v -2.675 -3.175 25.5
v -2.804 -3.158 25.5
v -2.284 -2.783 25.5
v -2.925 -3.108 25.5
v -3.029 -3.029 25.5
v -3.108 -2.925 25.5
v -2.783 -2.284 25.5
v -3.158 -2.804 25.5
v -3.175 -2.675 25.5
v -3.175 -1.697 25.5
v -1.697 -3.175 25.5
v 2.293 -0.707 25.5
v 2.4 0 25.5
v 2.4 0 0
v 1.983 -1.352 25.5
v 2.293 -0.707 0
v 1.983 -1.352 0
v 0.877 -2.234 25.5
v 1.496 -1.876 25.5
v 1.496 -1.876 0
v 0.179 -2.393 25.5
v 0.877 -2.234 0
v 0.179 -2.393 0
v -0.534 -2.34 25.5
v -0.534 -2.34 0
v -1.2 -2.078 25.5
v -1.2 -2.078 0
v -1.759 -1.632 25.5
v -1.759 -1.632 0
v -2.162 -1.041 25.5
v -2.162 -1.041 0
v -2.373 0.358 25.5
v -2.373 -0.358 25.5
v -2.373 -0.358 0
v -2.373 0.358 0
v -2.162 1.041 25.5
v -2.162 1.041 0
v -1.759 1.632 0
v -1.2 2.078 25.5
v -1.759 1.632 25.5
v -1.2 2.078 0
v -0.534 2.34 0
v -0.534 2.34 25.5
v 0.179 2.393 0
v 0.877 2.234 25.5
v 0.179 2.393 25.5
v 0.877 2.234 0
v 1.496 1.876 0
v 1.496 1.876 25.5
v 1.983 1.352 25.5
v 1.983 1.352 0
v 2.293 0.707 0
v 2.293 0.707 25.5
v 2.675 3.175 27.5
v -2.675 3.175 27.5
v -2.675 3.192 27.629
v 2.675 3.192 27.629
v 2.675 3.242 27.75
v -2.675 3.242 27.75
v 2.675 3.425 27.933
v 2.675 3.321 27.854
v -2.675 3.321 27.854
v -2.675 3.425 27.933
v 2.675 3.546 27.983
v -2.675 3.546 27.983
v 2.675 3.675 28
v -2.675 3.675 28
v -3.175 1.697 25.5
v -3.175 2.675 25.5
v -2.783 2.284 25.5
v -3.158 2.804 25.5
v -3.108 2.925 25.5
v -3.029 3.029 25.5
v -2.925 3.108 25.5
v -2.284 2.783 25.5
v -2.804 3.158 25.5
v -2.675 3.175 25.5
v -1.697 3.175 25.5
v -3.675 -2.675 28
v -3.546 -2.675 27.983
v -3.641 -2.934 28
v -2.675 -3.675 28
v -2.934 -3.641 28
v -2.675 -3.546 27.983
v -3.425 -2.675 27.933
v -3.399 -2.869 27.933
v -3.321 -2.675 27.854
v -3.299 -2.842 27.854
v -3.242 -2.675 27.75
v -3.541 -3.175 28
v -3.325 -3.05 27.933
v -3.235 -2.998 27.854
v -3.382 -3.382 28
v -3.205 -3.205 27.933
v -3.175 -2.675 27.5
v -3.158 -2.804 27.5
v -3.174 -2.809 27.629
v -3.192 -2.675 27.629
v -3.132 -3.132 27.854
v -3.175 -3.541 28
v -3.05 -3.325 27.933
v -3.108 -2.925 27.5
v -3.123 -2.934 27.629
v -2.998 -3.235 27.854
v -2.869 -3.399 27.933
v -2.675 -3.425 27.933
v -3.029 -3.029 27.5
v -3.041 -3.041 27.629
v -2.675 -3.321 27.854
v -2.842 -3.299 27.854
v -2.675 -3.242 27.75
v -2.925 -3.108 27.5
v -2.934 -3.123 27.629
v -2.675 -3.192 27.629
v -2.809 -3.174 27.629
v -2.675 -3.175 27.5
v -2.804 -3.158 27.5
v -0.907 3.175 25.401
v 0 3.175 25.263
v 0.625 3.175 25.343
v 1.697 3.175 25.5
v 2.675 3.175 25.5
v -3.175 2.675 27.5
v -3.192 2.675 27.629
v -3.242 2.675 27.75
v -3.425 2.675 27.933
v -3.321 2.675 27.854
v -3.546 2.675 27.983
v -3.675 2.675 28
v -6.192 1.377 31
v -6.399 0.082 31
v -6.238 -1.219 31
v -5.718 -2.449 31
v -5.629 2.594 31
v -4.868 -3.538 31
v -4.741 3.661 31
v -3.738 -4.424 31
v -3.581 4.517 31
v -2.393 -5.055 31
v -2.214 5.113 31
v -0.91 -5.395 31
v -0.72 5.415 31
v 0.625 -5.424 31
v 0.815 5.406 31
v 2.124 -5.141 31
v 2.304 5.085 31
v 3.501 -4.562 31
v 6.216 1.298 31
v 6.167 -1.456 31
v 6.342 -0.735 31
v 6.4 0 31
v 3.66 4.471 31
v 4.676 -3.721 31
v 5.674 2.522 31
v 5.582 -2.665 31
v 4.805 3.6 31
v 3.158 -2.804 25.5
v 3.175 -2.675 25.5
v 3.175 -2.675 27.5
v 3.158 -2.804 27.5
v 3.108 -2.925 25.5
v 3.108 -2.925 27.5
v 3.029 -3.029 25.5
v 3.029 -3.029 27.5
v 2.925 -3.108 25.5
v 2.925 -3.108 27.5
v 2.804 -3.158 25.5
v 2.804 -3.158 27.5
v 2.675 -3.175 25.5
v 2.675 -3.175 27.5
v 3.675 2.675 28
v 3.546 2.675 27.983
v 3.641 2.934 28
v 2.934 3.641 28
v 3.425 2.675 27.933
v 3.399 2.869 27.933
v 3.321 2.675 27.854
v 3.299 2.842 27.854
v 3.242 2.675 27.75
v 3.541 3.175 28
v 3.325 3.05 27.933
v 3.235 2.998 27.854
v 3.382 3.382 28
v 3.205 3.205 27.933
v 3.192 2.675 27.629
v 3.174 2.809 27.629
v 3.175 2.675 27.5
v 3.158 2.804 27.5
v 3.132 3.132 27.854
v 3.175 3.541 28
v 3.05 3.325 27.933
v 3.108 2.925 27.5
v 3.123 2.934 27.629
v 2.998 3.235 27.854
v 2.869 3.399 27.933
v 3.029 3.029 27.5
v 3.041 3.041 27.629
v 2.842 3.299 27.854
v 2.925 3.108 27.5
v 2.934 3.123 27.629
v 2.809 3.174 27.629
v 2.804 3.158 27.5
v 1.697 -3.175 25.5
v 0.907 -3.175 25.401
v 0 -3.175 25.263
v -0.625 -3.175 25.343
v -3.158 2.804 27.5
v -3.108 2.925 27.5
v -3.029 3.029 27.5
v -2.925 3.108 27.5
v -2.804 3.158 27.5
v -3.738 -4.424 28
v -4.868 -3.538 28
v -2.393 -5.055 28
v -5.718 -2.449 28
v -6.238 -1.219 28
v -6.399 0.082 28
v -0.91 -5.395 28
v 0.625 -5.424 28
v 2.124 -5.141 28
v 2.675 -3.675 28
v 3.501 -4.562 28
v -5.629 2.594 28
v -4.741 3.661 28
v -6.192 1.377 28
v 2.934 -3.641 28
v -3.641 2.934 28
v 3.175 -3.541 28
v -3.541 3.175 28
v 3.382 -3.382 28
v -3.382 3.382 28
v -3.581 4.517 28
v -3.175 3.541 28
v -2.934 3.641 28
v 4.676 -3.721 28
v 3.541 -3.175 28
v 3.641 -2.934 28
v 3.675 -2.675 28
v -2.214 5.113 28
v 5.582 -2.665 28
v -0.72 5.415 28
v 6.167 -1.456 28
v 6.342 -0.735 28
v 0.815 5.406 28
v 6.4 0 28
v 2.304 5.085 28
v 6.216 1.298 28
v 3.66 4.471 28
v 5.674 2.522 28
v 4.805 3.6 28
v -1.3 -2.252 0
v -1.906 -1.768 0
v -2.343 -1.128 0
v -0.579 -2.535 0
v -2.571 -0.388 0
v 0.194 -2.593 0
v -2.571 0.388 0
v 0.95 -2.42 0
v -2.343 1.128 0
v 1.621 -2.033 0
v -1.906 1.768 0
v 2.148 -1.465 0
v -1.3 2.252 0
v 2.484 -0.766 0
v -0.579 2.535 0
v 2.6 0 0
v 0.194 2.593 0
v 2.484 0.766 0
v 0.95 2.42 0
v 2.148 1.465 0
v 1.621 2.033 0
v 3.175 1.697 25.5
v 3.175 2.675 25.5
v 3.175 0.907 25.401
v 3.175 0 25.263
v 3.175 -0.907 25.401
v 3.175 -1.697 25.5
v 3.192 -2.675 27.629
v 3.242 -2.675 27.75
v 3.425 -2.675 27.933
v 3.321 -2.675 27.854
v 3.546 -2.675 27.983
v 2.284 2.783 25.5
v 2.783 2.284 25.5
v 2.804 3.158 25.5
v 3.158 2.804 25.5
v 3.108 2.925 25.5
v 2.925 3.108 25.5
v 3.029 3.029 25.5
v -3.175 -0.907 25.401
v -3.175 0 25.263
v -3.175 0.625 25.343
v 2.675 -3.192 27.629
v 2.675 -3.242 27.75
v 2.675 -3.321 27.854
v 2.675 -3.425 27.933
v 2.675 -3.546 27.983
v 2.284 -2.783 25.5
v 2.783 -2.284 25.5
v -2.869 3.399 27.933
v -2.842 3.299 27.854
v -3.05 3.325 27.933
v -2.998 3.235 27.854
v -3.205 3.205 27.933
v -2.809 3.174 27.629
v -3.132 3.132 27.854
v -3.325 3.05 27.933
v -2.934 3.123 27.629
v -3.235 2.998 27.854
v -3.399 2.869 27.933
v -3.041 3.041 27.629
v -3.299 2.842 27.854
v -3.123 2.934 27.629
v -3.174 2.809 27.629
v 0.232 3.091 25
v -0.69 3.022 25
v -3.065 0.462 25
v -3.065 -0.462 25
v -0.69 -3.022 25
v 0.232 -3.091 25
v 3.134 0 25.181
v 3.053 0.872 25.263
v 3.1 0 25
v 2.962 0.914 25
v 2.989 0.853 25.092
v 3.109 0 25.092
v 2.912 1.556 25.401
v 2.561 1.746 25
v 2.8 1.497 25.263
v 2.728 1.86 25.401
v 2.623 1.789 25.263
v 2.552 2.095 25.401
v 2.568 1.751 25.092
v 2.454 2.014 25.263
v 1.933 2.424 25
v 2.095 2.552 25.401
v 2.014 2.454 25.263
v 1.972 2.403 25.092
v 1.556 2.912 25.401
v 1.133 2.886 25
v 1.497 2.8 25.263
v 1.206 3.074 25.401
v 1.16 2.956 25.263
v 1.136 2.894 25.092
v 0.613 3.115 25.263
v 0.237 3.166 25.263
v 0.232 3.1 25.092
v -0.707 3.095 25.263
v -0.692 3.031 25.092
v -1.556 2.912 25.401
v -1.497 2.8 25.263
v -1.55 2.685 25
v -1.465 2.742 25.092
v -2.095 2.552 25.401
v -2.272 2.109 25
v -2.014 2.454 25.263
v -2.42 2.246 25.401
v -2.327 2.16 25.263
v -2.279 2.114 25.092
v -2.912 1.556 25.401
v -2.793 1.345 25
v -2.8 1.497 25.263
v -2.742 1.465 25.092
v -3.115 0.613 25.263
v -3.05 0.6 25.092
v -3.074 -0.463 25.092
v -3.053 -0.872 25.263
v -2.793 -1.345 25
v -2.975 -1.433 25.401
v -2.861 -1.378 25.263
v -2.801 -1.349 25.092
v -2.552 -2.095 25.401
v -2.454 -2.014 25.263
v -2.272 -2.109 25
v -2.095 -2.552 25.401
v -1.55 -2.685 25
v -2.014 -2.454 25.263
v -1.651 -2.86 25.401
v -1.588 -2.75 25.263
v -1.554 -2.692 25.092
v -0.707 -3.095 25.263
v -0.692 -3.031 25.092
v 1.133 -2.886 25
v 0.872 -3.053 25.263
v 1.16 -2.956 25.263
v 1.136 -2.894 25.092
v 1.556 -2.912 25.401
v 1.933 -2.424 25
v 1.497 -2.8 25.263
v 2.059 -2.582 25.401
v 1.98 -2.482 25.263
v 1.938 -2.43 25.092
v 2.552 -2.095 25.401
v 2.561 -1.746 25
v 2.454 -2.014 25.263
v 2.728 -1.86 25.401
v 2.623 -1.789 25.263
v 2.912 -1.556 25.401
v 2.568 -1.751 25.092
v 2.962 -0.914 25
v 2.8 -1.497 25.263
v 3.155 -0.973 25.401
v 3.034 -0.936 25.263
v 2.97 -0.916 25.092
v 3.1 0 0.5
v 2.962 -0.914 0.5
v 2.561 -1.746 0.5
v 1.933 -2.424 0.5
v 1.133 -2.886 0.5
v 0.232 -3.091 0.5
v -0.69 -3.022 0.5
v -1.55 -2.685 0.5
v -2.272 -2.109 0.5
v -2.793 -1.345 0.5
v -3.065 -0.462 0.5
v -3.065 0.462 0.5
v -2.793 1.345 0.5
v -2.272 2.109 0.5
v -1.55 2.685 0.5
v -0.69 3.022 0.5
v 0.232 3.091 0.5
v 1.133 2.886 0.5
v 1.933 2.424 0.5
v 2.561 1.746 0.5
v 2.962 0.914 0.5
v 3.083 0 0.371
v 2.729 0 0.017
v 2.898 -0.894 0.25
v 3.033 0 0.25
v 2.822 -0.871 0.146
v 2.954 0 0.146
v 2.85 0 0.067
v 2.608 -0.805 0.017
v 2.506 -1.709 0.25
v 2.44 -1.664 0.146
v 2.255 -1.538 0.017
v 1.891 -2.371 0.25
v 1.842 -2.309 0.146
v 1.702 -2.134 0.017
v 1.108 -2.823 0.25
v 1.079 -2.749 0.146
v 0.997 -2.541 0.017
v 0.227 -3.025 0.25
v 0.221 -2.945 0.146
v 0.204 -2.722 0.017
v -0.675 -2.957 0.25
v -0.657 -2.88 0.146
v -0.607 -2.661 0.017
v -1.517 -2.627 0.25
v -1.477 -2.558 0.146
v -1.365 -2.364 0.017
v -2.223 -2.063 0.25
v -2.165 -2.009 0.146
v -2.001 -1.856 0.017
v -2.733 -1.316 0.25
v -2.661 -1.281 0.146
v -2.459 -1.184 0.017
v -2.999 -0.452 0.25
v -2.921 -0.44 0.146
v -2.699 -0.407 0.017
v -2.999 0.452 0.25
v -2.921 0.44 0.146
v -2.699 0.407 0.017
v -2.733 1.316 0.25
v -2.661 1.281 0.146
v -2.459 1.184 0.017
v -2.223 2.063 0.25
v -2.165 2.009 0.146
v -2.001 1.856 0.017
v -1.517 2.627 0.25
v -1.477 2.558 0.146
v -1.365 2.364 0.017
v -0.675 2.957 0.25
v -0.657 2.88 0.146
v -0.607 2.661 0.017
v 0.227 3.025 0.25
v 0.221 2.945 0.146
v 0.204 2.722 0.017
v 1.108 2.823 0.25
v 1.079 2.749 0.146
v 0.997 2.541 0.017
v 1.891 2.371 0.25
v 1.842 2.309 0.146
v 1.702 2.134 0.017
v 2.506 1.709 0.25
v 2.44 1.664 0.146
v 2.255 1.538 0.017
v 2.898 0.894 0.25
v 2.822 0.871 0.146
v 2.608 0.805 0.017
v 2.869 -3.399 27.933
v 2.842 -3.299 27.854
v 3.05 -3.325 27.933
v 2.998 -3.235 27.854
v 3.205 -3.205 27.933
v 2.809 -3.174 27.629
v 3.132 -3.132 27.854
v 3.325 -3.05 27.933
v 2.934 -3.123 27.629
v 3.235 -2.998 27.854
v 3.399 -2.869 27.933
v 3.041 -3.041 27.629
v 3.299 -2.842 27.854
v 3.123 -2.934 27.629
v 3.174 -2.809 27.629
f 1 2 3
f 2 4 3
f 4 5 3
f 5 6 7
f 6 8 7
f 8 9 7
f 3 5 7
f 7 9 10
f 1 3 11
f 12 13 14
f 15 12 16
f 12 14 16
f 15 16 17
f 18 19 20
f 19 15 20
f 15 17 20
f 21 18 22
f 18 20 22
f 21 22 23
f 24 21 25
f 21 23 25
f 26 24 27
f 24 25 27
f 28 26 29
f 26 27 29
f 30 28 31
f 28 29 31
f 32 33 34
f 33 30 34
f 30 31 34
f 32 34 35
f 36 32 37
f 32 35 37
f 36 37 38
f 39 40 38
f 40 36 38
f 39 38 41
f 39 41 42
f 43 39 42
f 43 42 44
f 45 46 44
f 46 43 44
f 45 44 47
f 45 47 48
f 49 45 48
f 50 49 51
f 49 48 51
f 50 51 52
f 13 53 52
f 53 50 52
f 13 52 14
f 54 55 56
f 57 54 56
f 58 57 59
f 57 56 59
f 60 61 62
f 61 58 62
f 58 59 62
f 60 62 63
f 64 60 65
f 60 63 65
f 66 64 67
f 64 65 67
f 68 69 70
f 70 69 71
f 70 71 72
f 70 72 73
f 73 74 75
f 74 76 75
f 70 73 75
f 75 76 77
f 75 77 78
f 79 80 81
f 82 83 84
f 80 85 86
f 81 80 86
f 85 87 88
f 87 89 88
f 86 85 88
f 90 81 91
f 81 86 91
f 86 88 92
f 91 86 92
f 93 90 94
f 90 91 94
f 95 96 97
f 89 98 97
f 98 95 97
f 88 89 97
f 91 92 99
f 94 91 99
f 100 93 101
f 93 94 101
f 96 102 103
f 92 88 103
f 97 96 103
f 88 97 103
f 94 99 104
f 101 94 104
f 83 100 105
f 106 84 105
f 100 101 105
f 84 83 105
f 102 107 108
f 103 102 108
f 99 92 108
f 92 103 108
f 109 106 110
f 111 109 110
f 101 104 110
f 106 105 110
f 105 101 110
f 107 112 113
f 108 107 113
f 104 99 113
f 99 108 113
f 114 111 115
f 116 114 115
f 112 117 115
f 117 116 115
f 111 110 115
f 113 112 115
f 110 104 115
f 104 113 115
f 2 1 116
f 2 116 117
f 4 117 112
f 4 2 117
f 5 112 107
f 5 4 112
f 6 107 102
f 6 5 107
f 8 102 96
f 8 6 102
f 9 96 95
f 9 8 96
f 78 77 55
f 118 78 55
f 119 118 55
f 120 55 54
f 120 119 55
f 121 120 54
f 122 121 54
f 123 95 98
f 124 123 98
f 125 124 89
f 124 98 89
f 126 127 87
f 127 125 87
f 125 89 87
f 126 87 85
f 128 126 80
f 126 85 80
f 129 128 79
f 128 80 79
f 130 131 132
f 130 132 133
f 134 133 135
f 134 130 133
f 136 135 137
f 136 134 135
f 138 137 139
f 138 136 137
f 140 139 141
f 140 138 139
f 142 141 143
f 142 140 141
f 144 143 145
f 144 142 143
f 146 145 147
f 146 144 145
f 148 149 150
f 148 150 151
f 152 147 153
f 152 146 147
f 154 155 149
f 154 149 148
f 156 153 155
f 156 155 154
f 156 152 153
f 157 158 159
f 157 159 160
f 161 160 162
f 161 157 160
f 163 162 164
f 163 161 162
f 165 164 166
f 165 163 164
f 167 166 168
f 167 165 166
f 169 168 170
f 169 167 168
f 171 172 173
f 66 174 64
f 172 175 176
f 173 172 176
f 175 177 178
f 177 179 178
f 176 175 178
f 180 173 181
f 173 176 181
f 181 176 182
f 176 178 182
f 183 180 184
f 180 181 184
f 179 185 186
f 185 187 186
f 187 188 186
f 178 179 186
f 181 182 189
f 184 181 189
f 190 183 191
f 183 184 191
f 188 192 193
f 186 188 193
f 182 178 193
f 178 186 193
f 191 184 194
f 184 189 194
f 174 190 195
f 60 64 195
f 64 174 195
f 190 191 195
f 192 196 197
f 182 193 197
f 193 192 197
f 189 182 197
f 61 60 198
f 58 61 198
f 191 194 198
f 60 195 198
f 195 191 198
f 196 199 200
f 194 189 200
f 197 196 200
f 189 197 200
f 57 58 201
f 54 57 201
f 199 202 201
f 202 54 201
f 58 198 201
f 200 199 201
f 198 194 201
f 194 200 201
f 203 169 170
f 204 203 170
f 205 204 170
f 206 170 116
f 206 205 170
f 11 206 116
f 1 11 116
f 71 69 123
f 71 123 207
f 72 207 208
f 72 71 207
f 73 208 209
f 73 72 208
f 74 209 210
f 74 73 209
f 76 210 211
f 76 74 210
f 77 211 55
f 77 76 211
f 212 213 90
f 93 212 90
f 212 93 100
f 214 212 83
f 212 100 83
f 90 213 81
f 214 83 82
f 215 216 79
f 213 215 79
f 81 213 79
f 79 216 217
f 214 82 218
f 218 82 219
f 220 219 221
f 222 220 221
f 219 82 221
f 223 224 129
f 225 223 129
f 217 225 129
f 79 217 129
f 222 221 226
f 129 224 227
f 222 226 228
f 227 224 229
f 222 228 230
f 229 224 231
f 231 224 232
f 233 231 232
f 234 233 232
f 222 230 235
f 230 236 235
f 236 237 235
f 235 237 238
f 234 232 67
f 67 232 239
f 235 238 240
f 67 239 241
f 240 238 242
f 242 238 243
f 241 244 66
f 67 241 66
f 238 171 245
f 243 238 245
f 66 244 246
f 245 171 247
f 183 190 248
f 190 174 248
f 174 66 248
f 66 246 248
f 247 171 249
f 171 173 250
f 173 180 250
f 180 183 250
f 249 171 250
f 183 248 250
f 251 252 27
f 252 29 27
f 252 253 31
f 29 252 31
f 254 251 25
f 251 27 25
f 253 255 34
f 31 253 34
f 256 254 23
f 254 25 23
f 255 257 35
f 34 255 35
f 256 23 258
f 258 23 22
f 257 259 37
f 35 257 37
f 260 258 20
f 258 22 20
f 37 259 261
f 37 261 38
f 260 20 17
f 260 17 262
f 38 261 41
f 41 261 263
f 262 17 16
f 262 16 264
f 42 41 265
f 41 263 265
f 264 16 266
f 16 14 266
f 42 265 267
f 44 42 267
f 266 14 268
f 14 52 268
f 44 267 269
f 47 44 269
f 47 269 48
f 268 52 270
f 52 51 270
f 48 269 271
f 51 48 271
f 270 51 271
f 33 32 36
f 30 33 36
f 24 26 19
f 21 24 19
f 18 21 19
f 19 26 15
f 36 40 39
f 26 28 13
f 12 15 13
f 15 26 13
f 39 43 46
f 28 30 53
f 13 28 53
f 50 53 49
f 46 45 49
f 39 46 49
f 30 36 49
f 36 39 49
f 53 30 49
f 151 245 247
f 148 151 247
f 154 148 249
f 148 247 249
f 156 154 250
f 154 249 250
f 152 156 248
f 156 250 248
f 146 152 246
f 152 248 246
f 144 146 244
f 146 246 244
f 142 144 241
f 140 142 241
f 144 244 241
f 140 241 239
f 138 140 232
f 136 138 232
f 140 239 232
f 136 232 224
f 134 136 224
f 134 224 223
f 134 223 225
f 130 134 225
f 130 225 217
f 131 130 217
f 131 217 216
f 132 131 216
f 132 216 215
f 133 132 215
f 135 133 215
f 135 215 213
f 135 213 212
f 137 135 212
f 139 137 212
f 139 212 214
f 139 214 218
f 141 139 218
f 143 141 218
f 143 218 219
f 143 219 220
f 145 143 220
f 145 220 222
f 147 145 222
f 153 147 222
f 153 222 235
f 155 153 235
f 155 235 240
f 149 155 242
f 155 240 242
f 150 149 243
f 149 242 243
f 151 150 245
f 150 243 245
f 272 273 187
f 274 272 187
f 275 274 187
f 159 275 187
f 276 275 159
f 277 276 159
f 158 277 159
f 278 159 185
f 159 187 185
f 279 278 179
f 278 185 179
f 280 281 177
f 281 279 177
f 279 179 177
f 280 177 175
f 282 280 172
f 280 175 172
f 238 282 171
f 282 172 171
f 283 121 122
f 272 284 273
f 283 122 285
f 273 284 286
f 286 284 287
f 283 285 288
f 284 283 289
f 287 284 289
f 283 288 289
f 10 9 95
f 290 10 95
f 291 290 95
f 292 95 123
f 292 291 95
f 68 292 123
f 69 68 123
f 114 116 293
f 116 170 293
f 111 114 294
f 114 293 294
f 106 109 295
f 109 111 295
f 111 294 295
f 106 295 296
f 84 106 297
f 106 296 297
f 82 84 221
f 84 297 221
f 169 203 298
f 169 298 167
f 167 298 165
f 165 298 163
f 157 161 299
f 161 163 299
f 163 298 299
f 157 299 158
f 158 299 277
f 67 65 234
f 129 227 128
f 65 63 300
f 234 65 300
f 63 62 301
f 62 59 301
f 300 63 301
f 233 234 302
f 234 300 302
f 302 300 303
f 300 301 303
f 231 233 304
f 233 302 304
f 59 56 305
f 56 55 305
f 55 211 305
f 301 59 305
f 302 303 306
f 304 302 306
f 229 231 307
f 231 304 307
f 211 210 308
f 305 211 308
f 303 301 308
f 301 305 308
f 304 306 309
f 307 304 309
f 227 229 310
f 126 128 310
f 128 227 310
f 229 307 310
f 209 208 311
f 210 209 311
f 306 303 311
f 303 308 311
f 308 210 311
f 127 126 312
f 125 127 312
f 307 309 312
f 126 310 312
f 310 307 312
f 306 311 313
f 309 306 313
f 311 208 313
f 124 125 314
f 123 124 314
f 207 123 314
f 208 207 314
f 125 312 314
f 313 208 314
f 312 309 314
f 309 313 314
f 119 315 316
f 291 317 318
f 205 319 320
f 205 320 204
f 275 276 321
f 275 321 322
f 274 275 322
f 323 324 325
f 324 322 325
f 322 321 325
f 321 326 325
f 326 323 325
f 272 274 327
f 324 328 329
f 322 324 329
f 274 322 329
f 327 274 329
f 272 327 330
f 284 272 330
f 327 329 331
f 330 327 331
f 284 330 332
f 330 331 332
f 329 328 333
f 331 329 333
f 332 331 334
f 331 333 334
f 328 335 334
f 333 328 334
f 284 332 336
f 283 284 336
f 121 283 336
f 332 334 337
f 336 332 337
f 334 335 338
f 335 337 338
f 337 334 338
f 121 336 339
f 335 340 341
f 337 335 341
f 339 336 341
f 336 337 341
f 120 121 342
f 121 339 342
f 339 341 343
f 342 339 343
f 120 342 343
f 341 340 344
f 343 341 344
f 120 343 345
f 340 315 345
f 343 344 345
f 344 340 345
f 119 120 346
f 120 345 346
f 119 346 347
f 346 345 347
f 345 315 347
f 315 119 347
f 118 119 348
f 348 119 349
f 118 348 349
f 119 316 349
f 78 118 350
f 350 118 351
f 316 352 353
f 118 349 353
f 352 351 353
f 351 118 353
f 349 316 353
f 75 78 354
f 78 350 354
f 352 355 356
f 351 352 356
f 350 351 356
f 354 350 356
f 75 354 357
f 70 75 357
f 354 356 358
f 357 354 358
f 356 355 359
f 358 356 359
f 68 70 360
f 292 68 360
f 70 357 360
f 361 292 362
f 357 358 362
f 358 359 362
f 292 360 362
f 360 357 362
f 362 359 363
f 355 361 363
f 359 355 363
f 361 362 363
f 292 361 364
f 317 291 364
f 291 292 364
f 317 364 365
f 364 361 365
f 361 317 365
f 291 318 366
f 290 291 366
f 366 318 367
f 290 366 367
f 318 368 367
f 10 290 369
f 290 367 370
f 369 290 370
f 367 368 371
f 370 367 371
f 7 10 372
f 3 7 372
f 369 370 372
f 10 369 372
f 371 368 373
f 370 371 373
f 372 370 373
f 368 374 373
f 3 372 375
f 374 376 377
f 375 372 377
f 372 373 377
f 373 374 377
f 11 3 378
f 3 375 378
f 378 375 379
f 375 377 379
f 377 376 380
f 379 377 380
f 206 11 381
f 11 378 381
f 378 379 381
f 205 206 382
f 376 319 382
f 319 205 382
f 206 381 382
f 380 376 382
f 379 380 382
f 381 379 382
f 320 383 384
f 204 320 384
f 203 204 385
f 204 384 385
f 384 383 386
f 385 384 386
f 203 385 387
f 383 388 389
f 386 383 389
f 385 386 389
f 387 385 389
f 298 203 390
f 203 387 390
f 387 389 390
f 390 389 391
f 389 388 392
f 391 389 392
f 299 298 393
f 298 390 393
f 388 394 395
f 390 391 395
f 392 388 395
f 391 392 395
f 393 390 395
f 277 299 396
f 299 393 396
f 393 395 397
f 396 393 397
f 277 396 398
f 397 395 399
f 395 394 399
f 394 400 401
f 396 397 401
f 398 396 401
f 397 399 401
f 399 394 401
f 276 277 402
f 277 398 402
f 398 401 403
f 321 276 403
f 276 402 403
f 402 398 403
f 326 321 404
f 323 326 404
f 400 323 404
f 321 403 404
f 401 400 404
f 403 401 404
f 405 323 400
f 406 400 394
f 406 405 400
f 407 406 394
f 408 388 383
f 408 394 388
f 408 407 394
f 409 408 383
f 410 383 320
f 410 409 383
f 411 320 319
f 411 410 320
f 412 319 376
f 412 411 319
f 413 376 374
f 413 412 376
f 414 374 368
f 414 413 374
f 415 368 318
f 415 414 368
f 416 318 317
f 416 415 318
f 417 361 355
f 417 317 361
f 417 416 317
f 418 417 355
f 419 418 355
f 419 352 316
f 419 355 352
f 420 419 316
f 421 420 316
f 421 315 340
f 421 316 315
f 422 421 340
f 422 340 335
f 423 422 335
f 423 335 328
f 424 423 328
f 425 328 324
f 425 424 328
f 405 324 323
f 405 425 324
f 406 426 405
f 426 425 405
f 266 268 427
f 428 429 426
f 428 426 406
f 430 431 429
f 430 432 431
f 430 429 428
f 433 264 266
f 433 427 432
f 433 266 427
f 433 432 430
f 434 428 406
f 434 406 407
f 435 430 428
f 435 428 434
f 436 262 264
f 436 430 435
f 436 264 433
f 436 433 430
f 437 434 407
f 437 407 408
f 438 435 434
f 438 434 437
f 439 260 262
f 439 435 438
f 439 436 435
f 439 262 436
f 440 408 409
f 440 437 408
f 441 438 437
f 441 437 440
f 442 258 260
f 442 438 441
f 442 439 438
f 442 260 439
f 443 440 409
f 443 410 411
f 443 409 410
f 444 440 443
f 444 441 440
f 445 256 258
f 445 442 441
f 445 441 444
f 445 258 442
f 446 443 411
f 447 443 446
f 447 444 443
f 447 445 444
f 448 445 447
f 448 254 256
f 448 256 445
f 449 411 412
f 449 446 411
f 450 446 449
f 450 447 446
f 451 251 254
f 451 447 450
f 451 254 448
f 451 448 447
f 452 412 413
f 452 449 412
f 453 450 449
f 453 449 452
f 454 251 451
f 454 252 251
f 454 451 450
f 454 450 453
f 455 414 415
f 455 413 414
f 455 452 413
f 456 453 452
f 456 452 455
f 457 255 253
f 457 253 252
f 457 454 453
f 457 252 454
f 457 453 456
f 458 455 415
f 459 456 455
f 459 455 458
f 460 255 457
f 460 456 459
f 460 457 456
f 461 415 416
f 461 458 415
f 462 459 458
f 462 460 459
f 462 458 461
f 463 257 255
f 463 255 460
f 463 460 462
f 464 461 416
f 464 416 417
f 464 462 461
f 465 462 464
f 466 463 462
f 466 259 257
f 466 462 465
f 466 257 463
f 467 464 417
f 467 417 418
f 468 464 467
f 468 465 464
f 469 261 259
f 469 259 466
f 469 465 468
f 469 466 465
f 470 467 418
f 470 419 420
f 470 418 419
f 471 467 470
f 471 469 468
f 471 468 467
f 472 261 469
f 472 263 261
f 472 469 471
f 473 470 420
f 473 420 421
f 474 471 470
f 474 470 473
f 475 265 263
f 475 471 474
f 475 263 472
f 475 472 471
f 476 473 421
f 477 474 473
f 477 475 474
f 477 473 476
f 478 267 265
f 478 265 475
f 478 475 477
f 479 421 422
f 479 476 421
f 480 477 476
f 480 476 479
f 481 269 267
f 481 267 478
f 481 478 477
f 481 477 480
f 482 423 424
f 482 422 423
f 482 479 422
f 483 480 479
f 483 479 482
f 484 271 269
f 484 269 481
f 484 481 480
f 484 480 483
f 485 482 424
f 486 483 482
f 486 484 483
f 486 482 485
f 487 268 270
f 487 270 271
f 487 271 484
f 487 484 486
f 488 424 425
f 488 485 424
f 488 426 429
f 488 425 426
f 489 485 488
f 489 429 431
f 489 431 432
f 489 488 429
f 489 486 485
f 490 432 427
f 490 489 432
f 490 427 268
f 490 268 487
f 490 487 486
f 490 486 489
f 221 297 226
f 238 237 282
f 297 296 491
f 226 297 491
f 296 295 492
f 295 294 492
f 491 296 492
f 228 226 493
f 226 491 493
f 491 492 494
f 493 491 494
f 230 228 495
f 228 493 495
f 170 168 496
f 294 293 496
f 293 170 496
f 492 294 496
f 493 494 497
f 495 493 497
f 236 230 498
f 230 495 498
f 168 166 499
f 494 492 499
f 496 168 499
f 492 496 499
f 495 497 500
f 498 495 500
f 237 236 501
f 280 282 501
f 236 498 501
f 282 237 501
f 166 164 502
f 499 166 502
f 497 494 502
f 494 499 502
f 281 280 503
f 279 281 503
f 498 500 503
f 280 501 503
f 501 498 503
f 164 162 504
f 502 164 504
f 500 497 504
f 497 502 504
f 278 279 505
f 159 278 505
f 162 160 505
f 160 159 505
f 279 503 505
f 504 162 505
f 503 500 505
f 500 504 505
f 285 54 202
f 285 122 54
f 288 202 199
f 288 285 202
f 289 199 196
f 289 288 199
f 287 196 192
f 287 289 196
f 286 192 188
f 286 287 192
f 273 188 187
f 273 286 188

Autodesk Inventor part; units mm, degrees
ref_plane "YZ Plane" through (0, 0, 0) normal (1, 0, 0) x (0, 1, 0)
ref_plane "XZ Plane" through (0, 0, 0) normal (0, 1, 0) x (-1, 0, 0)
ref_plane "XY Plane" through (0, 0, 0) normal (0, 0, 1) x (1, 0, 0)
sketch "Sketch1" plane through (0, 0, 0) normal (0, 0, 1) x (1, 0, 0)
  circle A0 centre (0, 0) radius 3.1
  circle A1 centre (0, 0) radius 2.4
  dimension "d0" = 6.2
  dimension "d1" = 4.8
extrude "Extrusion1" add sketch "Sketch1" along normal blind 25.5
sketch "Sketch2" plane through (0, 0, 25.5) normal (0, 0, 1) x (1, 0, 0)
  line L0 (-3.175, 3.175) -> (3.175, 3.175)
  line L1 (3.175, 3.175) -> (3.175, -3.175)
  line L2 (3.175, -3.175) -> (-3.175, -3.175)
  line L3 (-3.175, -3.175) -> (-3.175, 3.175)
  circle A0 centre (0, 0) radius 2.4 projected
  line L4 (-3.175, 3.175) -> (3.175, -3.175) construction
  line L5 (3.175, 3.175) -> (-3.175, -3.175) construction
  dimension "d4" = 6.35
  dimension "d5" = 6.35
extrude "Extrusion2" add sketch "Sketch2" along normal blind 2.5 contours L0 L1 L2 L3 | A0
sketch "Sketch3" plane through (0, 0, 28) normal (0, 0, 1) x (1, 0, 0)
  ellipse E0 centre (0, 0) end of major axis (6.4, 0) minor radius 5.45
  dimension "d8" = 5.45
  dimension "d9" = 6.4
extrude "Extrusion3" add sketch "Sketch3" along normal blind 3
fillet "Fillet1" [suppressed]
fillet "Fillet2" radius 0.5 10 edges at (-3.175, 3.175, 26.75) (3.175, 3.175, 26.75) (0, 3.175, 28) (-3.175, 0, 28) (-3.175, -3.175, 26.75) (0, -3.175, 28) (3.175, -3.175, 26.75) (3.175, 0, 28) (-3.1, 0, 25.5) (-3.1, 0, 0)
thread "Thread1" size "M5x0.8" class "6H" standard "ANSI Metric M Profile" full length
properties part number "skaterScrew" material "Stainless Steel"
